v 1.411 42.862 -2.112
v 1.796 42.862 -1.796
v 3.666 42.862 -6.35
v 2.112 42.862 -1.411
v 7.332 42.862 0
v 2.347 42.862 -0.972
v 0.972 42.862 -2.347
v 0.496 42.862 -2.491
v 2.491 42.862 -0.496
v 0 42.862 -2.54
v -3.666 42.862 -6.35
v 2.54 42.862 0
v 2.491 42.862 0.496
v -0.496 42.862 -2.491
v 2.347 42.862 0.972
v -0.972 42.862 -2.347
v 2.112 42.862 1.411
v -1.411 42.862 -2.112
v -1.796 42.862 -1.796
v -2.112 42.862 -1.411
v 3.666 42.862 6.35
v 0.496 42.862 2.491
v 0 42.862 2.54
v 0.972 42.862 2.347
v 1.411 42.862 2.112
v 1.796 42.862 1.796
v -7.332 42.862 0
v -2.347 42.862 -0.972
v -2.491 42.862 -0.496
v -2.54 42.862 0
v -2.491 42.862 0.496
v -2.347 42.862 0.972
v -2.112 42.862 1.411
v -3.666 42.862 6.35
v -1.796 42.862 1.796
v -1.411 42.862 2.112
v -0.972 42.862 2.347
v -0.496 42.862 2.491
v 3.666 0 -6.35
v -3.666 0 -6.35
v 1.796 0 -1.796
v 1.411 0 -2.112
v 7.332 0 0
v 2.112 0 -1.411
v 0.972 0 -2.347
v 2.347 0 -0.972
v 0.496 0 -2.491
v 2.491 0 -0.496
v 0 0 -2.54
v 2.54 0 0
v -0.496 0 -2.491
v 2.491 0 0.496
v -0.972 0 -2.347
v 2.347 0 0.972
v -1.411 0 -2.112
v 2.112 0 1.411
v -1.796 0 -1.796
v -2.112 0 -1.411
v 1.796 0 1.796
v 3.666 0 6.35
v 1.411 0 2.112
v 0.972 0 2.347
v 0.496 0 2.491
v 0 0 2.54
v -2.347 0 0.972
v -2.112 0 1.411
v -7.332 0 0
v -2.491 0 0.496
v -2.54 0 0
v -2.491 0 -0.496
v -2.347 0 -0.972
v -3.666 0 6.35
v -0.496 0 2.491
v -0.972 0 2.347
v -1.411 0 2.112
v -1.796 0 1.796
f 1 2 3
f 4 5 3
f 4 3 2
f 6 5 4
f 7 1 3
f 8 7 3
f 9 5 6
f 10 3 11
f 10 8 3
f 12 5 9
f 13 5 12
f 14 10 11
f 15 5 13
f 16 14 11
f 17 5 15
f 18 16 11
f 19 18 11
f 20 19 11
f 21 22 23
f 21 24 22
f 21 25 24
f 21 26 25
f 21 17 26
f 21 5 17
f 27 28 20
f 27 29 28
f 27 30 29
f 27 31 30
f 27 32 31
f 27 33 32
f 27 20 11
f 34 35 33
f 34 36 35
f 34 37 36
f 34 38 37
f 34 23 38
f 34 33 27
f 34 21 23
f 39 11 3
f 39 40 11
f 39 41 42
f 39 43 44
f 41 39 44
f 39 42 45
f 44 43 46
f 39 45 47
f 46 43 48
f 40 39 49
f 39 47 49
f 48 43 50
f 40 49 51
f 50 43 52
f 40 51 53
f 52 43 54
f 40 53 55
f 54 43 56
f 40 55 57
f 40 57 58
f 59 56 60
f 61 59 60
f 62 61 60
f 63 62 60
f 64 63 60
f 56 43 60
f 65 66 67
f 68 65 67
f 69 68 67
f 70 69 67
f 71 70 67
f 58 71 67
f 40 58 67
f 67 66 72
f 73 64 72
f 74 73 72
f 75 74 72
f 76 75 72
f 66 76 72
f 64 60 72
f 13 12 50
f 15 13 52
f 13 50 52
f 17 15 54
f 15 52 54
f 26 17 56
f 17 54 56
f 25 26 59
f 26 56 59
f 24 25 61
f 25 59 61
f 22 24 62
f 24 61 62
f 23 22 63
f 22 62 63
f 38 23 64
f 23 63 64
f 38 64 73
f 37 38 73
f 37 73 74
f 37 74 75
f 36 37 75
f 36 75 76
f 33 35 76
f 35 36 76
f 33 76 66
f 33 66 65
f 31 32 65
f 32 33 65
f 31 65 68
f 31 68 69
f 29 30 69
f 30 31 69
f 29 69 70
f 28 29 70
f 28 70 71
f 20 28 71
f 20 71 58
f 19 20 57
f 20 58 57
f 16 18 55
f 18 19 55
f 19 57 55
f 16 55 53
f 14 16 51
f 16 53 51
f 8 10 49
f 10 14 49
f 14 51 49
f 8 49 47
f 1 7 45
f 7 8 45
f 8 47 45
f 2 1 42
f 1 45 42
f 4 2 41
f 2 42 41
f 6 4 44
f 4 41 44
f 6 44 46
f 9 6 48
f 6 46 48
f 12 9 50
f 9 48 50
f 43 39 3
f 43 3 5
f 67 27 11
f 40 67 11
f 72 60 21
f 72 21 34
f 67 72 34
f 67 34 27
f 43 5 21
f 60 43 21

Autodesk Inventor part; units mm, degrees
ref_plane "YZ Plane" through (0, 0, 0) normal (1, 0, 0) x (0, 1, 0)
ref_plane "XZ Plane" through (0, 0, 0) normal (0, 1, 0) x (-1, 0, 0)
ref_plane "XY Plane" through (0, 0, 0) normal (0, 0, 1) x (1, 0, 0)
sketch "Sketch1" plane through (0, 0, 0) normal (0, 1, 0) x (-1, 0, 0)
  line L0 (-3.6662, 6.35) -> (3.6662, 6.35)
  line L1 (3.6662, 6.35) -> (7.3323, 0)
  line L2 (7.3323, 0) -> (3.6662, -6.35)
  line L3 (3.6662, -6.35) -> (-3.6662, -6.35)
  line L4 (-3.6662, -6.35) -> (-7.3323, 0)
  line L5 (-7.3323, 0) -> (-3.6662, 6.35)
  point P0 (0, 0)
  point P1 (0, 0)
  dimension "d0" = 12.7
extrude "Extrusion1" add sketch "Sketch1" along normal blind 42.8625
sketch "Sketch2" plane through (0, 42.8625, 0) normal (0, 1, 0) x (1, 0, 0)
  circle A0 centre (0, 0) radius 2.54
  dimension "d3" = 5.08
extrude "Extrusion2" cut sketch "Sketch2" against normal blind 25.4
thread "Thread1" size "1/4-20 UNC" class "2B" standard "ANSI Unified Screw Threads" full length
sketch "Sketch3" plane through (0, 0, 0) normal (0, -1, 0) x (1, 0, 0)
  circle A0 centre (0, 0) radius 2.54
  dimension "d8" = 5.08
extrude "Extrusion3" cut sketch "Sketch3" against normal blind 25.4
thread "Thread2" size "1/4-20 UNC" class "2B" standard "ANSI Unified Screw Threads" full length
properties part number "OUTK_016_Shaft4" material "Aluminum 6061"
